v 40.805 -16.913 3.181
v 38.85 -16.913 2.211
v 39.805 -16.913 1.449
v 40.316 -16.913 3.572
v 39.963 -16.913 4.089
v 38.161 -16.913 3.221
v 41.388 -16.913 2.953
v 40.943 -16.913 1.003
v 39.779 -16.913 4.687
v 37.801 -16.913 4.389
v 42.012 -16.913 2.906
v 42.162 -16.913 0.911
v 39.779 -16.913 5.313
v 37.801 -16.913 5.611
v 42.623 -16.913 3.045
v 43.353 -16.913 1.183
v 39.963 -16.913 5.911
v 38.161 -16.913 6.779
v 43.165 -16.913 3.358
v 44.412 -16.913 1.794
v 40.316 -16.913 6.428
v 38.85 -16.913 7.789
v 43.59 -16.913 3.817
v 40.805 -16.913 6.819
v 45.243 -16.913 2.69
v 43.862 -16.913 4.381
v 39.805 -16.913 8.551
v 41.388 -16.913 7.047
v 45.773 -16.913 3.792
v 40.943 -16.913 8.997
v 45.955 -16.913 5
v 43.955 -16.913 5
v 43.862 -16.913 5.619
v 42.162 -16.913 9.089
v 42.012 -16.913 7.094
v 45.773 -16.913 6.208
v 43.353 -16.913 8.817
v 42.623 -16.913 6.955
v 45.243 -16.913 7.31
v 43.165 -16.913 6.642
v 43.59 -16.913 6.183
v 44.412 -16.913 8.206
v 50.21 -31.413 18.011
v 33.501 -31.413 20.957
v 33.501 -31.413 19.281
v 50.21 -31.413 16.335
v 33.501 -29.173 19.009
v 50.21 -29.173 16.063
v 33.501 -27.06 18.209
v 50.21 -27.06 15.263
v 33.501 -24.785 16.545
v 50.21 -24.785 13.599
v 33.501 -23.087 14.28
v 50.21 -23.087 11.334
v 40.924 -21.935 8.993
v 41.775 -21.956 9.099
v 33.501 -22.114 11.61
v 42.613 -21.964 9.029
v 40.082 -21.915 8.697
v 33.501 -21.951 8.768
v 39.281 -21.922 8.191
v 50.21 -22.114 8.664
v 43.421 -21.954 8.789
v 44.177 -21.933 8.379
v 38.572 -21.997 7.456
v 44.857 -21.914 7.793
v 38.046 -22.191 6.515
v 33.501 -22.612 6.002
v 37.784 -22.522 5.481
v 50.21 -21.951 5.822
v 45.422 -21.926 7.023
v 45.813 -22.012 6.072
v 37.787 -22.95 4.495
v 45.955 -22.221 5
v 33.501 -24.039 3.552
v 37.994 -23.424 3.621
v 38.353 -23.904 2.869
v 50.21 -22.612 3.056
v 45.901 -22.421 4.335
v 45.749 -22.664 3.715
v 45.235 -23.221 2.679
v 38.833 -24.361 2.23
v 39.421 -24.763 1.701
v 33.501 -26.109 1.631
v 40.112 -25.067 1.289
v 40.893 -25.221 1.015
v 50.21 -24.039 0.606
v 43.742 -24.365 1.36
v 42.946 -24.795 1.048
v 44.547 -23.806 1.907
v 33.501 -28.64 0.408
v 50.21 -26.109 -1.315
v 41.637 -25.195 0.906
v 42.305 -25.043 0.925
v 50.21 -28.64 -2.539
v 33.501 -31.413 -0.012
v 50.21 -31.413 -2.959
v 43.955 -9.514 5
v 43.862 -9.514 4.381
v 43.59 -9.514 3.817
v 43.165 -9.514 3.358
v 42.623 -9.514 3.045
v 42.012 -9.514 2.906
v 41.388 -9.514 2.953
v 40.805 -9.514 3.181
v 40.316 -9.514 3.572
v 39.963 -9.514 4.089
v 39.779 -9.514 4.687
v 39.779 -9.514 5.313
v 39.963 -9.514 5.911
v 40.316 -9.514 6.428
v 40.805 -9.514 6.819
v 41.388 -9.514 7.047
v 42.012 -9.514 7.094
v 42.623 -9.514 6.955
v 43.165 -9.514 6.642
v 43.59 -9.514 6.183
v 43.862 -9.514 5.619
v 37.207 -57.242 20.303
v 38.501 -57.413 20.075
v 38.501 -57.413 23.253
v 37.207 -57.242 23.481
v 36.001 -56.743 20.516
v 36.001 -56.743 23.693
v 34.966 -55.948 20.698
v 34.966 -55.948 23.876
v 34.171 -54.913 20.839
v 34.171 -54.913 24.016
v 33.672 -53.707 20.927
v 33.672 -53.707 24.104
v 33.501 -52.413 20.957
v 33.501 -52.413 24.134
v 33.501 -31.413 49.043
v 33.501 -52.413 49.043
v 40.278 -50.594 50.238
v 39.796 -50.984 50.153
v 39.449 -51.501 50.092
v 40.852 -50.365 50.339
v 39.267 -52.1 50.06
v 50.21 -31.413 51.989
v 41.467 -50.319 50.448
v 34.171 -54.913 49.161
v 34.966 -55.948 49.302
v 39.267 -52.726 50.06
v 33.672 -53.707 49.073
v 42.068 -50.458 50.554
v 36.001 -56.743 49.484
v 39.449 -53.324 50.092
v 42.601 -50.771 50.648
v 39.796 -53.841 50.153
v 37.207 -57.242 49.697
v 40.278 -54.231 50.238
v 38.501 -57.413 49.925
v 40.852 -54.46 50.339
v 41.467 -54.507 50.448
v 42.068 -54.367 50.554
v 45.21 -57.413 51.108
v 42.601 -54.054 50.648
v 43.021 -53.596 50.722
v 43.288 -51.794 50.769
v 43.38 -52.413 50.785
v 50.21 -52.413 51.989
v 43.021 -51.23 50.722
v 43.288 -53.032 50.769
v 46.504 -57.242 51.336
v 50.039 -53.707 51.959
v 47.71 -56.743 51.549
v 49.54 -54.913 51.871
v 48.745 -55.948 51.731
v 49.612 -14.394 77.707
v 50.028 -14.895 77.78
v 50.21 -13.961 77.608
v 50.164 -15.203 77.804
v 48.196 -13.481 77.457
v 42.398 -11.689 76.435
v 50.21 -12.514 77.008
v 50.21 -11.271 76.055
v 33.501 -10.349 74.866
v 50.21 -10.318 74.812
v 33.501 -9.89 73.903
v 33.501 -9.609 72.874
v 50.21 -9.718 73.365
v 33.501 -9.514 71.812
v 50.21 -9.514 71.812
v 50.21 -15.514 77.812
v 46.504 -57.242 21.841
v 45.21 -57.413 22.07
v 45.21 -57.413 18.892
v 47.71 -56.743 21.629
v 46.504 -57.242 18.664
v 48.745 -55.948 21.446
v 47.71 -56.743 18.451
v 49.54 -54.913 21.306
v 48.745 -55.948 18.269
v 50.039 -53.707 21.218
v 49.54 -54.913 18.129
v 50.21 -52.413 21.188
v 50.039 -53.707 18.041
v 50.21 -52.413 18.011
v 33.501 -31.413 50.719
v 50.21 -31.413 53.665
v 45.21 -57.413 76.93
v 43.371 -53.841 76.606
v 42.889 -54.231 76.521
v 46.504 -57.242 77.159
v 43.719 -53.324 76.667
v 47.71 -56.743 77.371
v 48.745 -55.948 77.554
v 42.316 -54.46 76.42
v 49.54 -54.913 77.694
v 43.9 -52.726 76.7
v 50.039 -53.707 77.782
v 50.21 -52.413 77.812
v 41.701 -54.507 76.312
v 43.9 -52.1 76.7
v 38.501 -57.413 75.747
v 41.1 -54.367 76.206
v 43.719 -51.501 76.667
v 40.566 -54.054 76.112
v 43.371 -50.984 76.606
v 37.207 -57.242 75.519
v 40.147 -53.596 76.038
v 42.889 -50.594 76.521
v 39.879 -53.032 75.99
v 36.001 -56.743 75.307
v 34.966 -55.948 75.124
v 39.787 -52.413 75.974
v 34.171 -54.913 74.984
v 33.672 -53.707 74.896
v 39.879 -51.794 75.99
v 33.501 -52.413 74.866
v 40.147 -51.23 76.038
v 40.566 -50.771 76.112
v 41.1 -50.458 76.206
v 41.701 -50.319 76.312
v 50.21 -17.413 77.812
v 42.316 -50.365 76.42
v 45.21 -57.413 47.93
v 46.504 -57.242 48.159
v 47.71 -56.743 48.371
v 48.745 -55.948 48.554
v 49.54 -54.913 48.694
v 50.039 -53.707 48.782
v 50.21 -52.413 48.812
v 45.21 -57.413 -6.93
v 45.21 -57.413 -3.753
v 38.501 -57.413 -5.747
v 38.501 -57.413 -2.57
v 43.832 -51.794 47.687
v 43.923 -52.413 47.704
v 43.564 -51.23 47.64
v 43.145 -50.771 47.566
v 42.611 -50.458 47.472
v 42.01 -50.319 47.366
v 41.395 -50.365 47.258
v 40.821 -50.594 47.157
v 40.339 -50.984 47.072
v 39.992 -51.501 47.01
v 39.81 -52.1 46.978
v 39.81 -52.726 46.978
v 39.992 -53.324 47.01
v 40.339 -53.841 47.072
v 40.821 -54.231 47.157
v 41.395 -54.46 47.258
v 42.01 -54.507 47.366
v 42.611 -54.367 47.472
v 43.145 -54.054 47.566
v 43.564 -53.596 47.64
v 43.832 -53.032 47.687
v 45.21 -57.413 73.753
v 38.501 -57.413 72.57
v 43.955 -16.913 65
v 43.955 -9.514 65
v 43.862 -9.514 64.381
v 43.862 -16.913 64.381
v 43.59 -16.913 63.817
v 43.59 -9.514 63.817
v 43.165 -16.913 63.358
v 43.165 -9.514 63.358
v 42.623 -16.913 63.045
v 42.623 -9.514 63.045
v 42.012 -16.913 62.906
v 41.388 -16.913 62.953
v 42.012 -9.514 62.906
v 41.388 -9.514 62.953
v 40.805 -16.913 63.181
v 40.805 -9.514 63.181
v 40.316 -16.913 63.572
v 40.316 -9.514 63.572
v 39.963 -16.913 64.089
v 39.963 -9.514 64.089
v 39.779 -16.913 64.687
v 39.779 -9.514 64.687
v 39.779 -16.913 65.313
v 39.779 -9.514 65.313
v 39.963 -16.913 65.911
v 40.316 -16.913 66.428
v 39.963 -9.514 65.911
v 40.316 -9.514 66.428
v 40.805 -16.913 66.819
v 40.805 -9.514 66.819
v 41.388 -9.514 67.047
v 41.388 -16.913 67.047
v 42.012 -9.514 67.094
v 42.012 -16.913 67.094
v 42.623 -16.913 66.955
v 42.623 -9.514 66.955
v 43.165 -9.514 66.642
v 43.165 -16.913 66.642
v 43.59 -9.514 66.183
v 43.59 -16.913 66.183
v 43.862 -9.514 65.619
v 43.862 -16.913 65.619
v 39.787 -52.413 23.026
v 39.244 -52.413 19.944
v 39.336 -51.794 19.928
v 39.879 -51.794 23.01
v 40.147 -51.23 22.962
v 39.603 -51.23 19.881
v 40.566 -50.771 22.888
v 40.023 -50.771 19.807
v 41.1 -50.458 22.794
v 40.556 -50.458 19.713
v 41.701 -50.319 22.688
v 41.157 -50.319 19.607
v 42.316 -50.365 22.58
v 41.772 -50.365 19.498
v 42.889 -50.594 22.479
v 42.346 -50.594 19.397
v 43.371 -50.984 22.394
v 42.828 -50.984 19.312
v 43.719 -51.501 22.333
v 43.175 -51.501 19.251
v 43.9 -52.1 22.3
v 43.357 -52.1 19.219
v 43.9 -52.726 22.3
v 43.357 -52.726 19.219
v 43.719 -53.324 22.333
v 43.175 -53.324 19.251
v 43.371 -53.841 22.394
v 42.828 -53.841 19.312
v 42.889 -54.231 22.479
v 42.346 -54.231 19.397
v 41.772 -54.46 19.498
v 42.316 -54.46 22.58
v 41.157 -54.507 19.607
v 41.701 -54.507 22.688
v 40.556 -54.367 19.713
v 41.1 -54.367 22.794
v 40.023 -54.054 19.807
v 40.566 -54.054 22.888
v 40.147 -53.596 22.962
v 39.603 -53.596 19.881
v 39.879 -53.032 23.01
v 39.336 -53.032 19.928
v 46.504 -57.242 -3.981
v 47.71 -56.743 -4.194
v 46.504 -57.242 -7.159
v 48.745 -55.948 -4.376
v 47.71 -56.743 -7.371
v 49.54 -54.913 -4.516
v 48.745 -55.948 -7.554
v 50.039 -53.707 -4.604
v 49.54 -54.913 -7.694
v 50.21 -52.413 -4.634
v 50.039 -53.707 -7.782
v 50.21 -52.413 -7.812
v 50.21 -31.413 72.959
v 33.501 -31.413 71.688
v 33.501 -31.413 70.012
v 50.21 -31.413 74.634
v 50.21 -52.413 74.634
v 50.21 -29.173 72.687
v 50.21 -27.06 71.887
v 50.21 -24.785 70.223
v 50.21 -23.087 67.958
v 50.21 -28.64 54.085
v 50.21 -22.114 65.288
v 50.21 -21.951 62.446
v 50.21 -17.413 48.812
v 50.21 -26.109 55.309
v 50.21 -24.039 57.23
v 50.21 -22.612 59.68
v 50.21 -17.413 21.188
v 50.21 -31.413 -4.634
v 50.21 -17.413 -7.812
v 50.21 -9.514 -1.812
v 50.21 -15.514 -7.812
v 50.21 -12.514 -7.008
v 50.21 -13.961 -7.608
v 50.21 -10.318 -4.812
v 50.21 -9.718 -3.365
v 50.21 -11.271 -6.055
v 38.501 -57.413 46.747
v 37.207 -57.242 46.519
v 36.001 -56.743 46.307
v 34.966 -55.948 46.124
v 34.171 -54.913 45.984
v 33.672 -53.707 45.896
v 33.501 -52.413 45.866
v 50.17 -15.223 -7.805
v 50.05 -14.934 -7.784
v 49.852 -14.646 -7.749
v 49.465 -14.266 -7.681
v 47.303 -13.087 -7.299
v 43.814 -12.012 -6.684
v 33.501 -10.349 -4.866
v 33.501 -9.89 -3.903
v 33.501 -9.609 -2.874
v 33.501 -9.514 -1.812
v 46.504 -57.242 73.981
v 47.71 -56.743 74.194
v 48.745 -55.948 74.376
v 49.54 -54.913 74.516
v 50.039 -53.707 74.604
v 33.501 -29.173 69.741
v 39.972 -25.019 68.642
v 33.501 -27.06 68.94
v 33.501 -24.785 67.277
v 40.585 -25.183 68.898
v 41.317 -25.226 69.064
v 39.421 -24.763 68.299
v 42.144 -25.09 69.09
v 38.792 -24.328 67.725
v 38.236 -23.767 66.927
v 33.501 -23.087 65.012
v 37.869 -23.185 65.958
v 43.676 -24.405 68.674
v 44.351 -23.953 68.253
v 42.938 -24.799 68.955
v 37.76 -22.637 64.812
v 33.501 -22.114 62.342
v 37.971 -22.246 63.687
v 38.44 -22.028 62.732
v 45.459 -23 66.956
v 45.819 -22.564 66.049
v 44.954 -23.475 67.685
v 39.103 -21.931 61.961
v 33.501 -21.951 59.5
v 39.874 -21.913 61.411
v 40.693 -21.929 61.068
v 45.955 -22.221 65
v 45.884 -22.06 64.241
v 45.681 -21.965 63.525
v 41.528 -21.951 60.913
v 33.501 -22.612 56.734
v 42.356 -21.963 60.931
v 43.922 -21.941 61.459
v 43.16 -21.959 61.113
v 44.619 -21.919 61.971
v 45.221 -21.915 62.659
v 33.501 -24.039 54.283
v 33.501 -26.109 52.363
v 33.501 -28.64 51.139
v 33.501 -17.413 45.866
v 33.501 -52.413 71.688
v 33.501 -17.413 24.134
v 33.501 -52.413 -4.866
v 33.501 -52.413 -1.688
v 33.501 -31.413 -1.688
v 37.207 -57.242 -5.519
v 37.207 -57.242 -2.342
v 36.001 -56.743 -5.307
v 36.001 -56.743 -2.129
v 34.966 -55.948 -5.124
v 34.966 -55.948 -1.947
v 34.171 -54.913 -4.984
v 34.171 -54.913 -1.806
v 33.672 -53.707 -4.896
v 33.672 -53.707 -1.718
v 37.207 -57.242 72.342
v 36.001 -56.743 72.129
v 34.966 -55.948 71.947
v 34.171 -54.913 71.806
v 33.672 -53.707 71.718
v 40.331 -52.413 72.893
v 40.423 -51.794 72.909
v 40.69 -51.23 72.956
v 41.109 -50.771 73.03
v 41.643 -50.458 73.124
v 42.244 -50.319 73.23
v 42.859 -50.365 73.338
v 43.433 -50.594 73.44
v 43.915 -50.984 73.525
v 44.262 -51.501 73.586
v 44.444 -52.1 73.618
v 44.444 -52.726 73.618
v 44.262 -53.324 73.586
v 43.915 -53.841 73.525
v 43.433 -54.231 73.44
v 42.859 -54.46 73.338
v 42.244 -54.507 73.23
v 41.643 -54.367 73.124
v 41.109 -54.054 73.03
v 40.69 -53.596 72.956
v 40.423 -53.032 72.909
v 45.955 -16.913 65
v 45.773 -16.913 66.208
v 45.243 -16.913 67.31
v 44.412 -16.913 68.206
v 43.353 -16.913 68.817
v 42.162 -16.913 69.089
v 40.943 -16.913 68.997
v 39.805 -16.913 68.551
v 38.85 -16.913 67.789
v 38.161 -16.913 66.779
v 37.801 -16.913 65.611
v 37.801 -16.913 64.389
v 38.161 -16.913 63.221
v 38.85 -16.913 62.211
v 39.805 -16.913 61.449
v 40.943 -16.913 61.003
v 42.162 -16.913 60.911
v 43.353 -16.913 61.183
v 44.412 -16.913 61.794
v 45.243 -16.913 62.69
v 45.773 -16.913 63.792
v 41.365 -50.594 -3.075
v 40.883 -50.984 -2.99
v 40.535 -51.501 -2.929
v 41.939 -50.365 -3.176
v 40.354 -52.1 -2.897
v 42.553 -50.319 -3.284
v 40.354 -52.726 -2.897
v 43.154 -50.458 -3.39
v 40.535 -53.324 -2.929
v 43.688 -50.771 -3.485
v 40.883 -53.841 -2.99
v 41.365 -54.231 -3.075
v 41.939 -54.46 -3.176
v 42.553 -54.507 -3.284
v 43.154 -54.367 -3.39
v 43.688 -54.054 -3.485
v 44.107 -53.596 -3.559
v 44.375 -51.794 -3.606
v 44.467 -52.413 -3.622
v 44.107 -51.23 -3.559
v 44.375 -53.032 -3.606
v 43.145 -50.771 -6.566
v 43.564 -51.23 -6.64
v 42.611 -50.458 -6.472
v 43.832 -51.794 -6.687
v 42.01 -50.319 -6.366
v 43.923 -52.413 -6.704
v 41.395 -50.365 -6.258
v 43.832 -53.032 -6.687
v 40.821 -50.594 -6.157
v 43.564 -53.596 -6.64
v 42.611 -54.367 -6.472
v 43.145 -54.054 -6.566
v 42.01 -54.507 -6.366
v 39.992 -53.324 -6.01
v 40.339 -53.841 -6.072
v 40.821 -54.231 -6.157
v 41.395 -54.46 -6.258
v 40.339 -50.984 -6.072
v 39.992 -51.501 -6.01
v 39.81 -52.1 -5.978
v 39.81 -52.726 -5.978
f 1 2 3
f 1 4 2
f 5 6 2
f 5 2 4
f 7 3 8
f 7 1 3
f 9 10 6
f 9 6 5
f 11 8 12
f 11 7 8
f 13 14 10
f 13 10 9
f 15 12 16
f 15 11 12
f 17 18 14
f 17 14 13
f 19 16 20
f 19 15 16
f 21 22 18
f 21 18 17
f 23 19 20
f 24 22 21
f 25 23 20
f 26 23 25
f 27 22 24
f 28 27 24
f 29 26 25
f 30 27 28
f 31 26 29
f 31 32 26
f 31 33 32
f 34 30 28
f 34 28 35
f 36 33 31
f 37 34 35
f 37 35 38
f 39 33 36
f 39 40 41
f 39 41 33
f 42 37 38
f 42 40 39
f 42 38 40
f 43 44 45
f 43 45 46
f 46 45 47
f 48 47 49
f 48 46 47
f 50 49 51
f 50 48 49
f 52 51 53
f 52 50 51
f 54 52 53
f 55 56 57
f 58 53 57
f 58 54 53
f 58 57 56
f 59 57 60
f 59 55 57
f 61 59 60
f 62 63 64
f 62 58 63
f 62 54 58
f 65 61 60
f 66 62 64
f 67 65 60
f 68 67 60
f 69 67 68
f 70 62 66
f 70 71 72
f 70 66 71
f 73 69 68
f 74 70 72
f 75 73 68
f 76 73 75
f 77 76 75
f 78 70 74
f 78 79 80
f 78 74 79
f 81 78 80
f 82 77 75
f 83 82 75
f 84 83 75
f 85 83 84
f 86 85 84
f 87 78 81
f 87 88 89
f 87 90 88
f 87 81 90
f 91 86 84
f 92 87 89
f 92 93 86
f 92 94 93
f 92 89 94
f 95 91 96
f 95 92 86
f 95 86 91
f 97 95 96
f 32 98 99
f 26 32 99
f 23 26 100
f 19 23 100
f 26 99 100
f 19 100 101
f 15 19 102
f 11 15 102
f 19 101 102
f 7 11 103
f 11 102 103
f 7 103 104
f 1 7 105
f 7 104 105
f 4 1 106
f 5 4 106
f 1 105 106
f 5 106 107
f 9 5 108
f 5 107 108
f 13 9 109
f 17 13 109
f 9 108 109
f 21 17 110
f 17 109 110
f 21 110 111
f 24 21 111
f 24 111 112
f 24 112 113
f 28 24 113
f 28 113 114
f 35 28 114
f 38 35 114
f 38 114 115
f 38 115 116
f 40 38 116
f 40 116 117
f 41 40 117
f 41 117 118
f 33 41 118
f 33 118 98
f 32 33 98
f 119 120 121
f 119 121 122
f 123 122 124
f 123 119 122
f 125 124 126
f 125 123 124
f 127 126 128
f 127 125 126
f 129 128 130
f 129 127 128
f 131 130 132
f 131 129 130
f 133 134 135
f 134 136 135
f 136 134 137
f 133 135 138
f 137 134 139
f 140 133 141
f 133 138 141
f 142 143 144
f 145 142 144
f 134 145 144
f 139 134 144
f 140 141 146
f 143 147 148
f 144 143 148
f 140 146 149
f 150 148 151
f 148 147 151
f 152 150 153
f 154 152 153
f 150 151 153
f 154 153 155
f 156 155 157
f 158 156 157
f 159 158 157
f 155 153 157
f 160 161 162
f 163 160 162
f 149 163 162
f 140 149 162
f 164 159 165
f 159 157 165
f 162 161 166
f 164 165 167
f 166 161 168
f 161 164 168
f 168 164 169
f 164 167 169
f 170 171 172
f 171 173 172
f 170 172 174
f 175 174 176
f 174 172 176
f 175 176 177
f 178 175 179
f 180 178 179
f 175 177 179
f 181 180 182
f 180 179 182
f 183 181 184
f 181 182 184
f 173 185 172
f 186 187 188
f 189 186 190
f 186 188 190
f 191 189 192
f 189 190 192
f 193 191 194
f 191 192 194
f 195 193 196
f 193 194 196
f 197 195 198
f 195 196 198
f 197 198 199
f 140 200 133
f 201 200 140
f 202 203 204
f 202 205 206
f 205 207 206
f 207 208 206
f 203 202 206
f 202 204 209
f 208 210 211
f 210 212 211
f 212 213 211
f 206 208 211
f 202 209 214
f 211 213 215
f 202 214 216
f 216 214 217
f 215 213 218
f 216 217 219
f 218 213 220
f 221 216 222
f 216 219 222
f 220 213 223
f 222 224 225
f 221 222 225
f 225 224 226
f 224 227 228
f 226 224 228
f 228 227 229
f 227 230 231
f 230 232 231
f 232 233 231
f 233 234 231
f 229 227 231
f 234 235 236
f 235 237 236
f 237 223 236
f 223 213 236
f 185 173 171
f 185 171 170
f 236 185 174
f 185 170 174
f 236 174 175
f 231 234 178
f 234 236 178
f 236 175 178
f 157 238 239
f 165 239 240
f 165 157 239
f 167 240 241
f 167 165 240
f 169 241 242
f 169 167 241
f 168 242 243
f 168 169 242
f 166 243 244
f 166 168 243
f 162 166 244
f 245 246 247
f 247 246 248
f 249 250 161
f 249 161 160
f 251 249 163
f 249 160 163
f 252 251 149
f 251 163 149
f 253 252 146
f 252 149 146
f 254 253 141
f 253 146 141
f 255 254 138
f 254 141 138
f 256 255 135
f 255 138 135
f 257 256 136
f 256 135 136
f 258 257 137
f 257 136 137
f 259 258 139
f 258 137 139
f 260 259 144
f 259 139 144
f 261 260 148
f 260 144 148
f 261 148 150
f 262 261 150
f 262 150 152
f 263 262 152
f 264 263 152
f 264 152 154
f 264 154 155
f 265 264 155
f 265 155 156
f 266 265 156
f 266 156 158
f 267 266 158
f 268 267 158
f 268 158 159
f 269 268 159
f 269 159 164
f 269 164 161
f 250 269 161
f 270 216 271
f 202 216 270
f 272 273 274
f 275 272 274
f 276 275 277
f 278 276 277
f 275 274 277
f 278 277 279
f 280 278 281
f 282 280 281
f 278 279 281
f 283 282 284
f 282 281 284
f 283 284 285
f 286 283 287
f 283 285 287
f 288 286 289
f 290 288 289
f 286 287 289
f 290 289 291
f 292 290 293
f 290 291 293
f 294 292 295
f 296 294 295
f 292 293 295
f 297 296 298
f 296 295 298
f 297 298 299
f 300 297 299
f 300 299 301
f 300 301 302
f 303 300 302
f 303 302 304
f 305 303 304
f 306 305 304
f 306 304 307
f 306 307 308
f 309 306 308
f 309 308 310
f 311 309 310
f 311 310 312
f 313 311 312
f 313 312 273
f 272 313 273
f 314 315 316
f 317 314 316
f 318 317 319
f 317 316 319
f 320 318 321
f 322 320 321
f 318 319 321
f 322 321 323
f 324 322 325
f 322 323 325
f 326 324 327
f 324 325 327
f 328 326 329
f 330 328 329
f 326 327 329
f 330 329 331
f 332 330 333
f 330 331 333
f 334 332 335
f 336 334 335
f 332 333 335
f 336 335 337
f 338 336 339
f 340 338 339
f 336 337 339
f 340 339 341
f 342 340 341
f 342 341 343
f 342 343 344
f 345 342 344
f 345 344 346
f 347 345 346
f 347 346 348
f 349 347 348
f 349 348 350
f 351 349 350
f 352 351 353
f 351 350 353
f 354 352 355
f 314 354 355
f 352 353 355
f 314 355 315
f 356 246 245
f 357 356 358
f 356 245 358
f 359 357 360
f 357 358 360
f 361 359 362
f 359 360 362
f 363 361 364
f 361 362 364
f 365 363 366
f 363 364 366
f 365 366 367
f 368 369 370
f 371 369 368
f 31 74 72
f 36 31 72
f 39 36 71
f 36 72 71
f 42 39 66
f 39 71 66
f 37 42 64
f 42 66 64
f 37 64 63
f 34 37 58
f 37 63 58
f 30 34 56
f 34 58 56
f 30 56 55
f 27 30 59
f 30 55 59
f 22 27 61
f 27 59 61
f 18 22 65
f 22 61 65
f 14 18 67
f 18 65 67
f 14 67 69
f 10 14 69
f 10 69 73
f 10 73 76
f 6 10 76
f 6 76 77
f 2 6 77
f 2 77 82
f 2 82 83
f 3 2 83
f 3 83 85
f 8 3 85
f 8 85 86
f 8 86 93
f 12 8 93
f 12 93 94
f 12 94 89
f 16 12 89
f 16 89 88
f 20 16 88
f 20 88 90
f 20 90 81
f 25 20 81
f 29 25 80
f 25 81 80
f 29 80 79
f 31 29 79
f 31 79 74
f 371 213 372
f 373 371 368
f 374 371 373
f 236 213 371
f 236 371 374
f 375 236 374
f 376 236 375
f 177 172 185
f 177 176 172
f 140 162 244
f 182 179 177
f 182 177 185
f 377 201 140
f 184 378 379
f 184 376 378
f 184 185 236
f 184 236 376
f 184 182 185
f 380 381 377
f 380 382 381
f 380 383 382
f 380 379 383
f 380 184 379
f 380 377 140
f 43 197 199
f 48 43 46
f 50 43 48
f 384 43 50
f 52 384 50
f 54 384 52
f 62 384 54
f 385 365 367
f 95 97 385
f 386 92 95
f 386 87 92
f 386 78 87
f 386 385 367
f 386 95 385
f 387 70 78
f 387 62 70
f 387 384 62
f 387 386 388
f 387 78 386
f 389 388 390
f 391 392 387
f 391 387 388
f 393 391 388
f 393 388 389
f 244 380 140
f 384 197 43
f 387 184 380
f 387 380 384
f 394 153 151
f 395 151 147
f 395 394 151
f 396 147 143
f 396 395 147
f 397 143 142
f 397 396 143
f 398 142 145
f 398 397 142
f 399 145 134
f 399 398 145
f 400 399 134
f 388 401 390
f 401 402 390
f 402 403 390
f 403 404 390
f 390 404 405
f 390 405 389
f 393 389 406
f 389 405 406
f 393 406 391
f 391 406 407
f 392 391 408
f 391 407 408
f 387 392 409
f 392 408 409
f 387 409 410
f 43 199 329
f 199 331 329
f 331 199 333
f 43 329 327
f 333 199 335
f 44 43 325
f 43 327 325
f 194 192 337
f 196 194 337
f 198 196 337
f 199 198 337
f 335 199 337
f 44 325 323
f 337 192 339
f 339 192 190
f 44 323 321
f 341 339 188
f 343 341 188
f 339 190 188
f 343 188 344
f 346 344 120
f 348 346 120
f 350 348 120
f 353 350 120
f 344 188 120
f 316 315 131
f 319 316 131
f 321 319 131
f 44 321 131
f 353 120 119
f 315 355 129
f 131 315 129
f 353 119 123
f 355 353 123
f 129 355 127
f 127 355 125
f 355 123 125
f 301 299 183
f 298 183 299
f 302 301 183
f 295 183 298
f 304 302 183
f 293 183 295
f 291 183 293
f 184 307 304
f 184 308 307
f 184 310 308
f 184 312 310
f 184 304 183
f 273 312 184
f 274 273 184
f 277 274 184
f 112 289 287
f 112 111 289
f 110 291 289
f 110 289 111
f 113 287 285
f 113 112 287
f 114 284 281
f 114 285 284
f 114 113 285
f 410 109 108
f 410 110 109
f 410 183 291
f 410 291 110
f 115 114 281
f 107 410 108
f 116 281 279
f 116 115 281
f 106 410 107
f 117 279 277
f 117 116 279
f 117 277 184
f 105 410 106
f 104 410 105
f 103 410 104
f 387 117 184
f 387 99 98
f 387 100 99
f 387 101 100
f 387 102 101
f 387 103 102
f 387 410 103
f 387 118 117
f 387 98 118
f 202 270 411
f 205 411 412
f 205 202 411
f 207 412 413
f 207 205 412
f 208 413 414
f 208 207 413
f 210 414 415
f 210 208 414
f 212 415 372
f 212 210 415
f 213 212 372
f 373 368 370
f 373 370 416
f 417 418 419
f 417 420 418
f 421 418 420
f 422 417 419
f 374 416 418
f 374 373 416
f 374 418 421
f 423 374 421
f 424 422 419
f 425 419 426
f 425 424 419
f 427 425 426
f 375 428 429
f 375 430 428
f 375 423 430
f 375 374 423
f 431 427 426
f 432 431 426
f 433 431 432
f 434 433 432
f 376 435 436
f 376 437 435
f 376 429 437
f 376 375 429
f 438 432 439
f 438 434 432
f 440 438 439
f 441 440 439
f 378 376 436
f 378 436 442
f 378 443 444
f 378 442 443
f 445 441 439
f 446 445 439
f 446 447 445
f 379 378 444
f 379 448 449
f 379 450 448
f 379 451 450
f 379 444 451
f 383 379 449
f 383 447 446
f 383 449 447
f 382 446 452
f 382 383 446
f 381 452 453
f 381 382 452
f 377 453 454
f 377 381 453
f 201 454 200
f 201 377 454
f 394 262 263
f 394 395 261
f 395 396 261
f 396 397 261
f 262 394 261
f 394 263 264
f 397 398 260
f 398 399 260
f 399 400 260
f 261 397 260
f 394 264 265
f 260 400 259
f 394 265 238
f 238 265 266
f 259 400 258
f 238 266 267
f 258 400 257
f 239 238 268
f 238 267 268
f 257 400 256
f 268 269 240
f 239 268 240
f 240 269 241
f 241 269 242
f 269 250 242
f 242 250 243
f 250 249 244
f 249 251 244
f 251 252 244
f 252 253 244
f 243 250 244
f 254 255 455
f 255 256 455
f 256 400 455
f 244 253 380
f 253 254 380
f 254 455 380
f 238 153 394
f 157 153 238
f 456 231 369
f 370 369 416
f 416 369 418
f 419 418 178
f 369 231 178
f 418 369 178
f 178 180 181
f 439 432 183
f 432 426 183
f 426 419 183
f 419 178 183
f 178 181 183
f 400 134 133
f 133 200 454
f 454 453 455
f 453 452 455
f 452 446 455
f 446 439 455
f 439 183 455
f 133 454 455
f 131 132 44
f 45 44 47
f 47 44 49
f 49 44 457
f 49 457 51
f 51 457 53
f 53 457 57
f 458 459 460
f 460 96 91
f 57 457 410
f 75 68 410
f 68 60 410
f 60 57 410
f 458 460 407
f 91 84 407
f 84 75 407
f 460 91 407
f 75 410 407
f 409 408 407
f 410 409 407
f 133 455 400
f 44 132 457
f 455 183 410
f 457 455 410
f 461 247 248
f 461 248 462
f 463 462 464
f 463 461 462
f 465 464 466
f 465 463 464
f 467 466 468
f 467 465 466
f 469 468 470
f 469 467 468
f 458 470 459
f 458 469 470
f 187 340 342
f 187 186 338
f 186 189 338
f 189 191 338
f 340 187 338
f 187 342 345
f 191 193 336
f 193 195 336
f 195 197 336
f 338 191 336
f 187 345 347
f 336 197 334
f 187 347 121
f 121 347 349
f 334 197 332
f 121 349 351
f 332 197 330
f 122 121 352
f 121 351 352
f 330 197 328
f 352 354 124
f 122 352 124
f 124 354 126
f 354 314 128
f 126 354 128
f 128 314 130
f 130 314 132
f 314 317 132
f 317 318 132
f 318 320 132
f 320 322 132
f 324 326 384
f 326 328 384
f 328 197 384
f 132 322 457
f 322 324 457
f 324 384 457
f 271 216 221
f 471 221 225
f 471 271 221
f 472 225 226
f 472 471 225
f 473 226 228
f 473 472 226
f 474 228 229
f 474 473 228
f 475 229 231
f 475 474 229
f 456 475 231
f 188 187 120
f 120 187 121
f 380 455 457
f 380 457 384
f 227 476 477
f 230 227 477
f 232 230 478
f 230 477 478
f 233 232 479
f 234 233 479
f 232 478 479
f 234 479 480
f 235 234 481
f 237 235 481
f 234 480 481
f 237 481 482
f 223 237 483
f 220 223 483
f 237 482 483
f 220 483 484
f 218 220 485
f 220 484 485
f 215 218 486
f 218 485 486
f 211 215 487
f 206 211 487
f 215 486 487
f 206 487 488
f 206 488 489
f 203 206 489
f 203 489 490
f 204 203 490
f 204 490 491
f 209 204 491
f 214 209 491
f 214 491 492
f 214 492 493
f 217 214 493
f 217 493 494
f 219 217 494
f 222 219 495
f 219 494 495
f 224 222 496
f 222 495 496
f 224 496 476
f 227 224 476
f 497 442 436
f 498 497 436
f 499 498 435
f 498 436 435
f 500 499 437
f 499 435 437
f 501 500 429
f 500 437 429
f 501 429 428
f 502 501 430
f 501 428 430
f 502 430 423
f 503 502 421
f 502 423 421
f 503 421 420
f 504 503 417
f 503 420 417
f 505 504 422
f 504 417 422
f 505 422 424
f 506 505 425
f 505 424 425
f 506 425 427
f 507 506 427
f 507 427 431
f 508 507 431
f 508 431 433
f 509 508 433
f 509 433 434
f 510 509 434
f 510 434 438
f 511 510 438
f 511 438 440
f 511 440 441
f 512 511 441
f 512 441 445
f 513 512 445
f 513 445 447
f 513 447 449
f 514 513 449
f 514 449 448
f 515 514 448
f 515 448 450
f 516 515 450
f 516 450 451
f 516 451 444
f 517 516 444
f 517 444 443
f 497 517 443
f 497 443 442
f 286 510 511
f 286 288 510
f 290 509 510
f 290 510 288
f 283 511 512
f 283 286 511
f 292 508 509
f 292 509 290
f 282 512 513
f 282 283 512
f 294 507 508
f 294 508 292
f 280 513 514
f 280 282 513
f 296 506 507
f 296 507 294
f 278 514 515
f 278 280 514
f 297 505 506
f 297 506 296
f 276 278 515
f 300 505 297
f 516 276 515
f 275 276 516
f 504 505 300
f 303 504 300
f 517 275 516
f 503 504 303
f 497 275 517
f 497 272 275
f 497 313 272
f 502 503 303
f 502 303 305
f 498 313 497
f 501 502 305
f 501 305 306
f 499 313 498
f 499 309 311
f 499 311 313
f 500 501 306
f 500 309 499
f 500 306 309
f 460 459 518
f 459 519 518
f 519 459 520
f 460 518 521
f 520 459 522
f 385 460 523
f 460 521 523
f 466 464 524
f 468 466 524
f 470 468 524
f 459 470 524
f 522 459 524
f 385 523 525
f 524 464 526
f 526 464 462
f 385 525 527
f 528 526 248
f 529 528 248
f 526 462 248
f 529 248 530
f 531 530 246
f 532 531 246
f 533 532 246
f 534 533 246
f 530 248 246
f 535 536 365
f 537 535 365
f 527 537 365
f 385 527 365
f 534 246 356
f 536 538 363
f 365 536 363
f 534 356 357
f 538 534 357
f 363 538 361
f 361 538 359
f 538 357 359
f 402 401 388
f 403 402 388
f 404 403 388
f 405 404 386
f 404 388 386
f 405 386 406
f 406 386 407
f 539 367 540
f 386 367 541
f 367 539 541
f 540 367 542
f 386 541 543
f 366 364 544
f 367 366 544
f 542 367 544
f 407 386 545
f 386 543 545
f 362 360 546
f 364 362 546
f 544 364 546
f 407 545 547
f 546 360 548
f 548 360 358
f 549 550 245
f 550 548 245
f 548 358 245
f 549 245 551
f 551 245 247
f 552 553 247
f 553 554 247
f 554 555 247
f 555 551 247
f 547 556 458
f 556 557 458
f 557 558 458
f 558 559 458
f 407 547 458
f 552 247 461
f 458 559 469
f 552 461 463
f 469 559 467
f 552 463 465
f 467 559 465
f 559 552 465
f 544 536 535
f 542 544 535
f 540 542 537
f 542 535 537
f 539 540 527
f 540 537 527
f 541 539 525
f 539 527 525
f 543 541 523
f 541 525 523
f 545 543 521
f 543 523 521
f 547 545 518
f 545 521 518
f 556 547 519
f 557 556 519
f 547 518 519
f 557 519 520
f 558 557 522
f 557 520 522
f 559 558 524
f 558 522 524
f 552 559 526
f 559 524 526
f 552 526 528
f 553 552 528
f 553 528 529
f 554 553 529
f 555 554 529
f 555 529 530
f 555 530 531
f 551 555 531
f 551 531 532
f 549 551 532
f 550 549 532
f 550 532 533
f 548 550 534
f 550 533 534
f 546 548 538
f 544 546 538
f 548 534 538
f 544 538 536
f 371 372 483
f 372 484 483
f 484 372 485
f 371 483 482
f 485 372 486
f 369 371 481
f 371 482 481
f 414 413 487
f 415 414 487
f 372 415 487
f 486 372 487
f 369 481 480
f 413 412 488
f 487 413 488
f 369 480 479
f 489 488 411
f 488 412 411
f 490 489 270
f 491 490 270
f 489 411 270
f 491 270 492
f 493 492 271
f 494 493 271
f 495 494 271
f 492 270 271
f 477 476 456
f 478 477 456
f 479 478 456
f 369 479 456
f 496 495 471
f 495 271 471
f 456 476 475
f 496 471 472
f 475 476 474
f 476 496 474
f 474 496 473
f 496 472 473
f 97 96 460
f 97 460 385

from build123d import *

# Parameters (mm, degrees)
SKETCH1_R             = 21
BOSS_EXTRUDE1_DEPTH   = 70
SKETCH2_W             = 46.708404894
SKETCH2_H             = 50
SKETCH2_W_2           = 13.291595106
CUT_EXTRUDE6_DEPTH    = 1000
CUT_EXTRUDE7_DEPTH    = 500
CUT_EXTRUDE9_DEPTH    = 10
CUT_EXTRUDE10_DEPTH   = 30
FILLET1_R             = 10
BOSS_EXTRUDE4_DEPTH   = 25
FILLET3_R             = 10
SKETCH14_R            = 4
CUT_EXTRUDE11_DEPTH   = 127.980923087
CUT_EXTRUDE12_START   = -2
CUT_EXTRUDE12_DEPTH   = 2
CUT_EXTRUDE13_DEPTH   = 2
BOSS_EXTRUDE5_REACH   = 117.988
SKETCH20_W            = 16.708404894
SKETCH20_H            = 7.898698888
SKETCH26_W            = 16.708404894
SKETCH26_H            = 7.898698888
BOSS_EXTRUDE12_DEPTH  = 7.811994
SKETCH27_W            = 16.708404894
SKETCH27_H            = 7.898698888
BOSS_EXTRUDE13_DEPTH  = 7.811994
FILLET4_R             = 6
FILLET5_R             = 6
BOSS_EXTRUDE14_DEPTH  = 40
BOSS_EXTRUDE15_DEPTH  = 40
CUT_EXTRUDE14_DEPTH   = 156.020628616
BOSS_EXTRUDE16_DEPTH  = 40
CUT_EXTRUDE16_DEPTH   = 154.401382374
CUT_EXTRUDE17_DEPTH   = 20
CUT_EXTRUDE18_DEPTH   = 20
CUT_EXTRUDE19_DEPTH   = 138.956751978
SKETCH40_W            = 185.24105406
SKETCH40_H            = 117.002542876
CUT_EXTRUDE21_DEPTH   = 127.12652477
SKETCH41_W            = 67.695511819
SKETCH41_H            = 32.478739283
CUT_EXTRUDE22_DEPTH   = 109.958332386
FILLET6_R             = 5
SKETCH78_R            = 4.1
CUT_EXTRUDE23_DEPTH   = 40.5
M5_TAPPED_HOLE2_D     = 4.2
M5_TAPPED_HOLE3_D     = 4.2
M5_TAPPED_HOLE3_DEPTH = 3.9381927
M5_TAPPED_HOLE3_TIP   = 1.2618073
M5_TAPPED_HOLE4_D     = 4.2
M5_TAPPED_HOLE4_DEPTH = 3.9381927
M5_TAPPED_HOLE4_TIP   = 1.2618073
M5_TAPPED_HOLE5_D     = 4.2
M5_TAPPED_HOLE5_DEPTH = 3.9381927
M5_TAPPED_HOLE5_TIP   = 1.2618073
M5_TAPPED_HOLE6_D     = 4.2
M5_TAPPED_HOLE6_DEPTH = 11.1381927
M5_TAPPED_HOLE6_TIP   = 1.2618073
CUT_EXTRUDE24_DEPTH   = 26
CUT_EXTRUDE25_DEPTH   = 26


with BuildPart() as part:
    # Sketch1 → Boss-Extrude1 (new body)
    with BuildSketch(Plane.XY):
        with BuildLine():
            Line((-49.790434142, -17.412639916), (50.209565858, -17.412639916))
            Line((50.209565858, -17.412639916), (50.209565858, -9.513941028))
            ThreePointArc((50.209565858, -9.513941028), (38.690061243, 42.665747249), (-10.864044799, 22.670512076))
            add(Edge.make_bspline(
                [(-49.790434142, -1.270303125), (-17.557932869, 2.386486473), (-10.864044799, 22.670512076)],
                knots=[0, 0, 0, 1, 1, 1], degree=2))
            Line((-49.790434142, -1.270303125), (-49.790434142, -17.412639916))
        make_face()
        with Locations((22.372880083, 11.702065313)):
            Circle(SKETCH1_R, mode=Mode.SUBTRACT)
    extrude(amount=BOSS_EXTRUDE1_DEPTH)

    # Sketch2 → Cut-Extrude6 (cut)
    with BuildSketch(Plane.XZ.offset(17.412639916)):
        with Locations((26.855363411, 35)):
            Rectangle(SKETCH2_W, SKETCH2_H)
        with Locations((56.855363411, 35)):
            Rectangle(SKETCH2_W_2, SKETCH2_H)
    extrude(amount=-CUT_EXTRUDE6_DEPTH, mode=Mode.SUBTRACT)

    # Sketch4 → Cut-Extrude7 (cut, symmetric)
    with BuildSketch(Plane(origin=(0, 0, 60), x_dir=(-1, 0, 0), z_dir=(0, 0, -1))):
        Polygon((-3.501160964, -17.412639916), (-33.501160964, -17.412639916), (-33.501160964, -6.106959496), (-3.501160964, 2.490213302), align=None)
    extrude(amount=CUT_EXTRUDE7_DEPTH, both=True, mode=Mode.SUBTRACT)

    # Sketch6 → Cut-Extrude9 (cut)
    with BuildSketch(Plane.XZ.offset(17.412639916)):
        with BuildLine():
            Line((-24.792277304, 11.964880704), (3.501160964, 10))
            Line((3.501160964, 10), (3.501160964, 60))
            Line((3.501160964, 60), (-24.792277304, 58.035119296))
            ThreePointArc((-24.792277304, 58.035119296), (-36.706675963, 52.357484539), (-41.545243514, 40.078368289))
            Line((-41.545243514, 40.078368289), (-41.545243514, 29.921631711))
            ThreePointArc((-41.545243514, 29.921631711), (-36.706675963, 17.642515461), (-24.792277304, 11.964880704))
        make_face()
    extrude(amount=-CUT_EXTRUDE9_DEPTH, mode=Mode.SUBTRACT)

    # Sketch7 → Cut-Extrude10 (cut)
    with BuildSketch(Plane.XZ.offset(17.412639916)):
        with BuildLine():
            Line((-49.790434142, 0), (-26.790434142, 0))
            ThreePointArc((-26.790434142, 0), (-40.575408311, 4.143958018), (-49.790434142, 15.202041029))
            Line((-49.790434142, 15.202041029), (-49.790434142, 0))
        make_face()
        with BuildLine():
            Line((-51.790434142, 0), (-49.790434142, 0))
            Line((-49.790434142, 0), (-49.790434142, 15.202041029))
            ThreePointArc((-49.790434142, 15.202041029), (-51.285331569, 20), (-51.790434142, 25))
            Line((-51.790434142, 25), (-51.790434142, 0))
        make_face()
        with BuildLine():
            ThreePointArc((-51.790434142, 45), (-51.285331569, 50), (-49.790434142, 54.797958971))
            Line((-49.790434142, 54.797958971), (-49.790434142, 70))
            Line((-49.790434142, 70), (-51.790434142, 70))
            Line((-51.790434142, 70), (-51.790434142, 45))
        make_face()
        with BuildLine():
            Line((-49.790434142, 70), (-49.790434142, 54.797958971))
            ThreePointArc((-49.790434142, 54.797958971), (-40.575408311, 65.856041982), (-26.790434142, 70))
            Line((-26.790434142, 70), (-49.790434142, 70))
        make_face()
        with BuildLine():
            ThreePointArc((-51.790434142, 25), (-51.285331569, 20), (-49.790434142, 15.202041029))
            Line((-49.790434142, 15.202041029), (-49.790434142, 54.797958971))
            ThreePointArc((-49.790434142, 54.797958971), (-51.285331569, 50), (-51.790434142, 45))
            Line((-51.790434142, 45), (-51.790434142, 25))
        make_face()
    extrude(amount=-CUT_EXTRUDE10_DEPTH, mode=Mode.SUBTRACT)

    # Fillet1
    fillet1_edges = [part.edges().sort_by_distance(p)[0] for p in [
        (-49.790434142, -1.270303125, 35),
    ]]
    fillet(fillet1_edges, radius=FILLET1_R)

    # Sketch13 → Boss-Extrude4 (add, symmetric)
    with BuildSketch(Plane(origin=(0, 0, 35), x_dir=(-1, 0, 0), z_dir=(0, 0, -1))):
        with BuildLine():
            Line((-3.501160964, 41.17846634), (-24.884209642, 72.591285845))
            Line((-24.884209642, 72.591285845), (-12.526412407, 81.003373139))
            Line((-12.526412407, 81.003373139), (8.038253711, 50.792800518))
            ThreePointArc((8.038253711, 50.792800518), (9.622093989, 48.312116906), (11.057231329, 45.742540671))
            Line((11.057231329, 45.742540671), (33.791827707, 2.064737728))
            add(Edge.make_bspline(
                [(10.864044799, 22.670512076), (15.694334208, 8.033620479), (33.791827707, 2.064737728)],
                knots=[0, 0, 0, 1, 1, 1], degree=2))
            ThreePointArc((10.864044799, 22.670512076), (5.276058191, 33.162172776), (-3.501160964, 41.17846634))
        make_face()
    extrude(amount=BOSS_EXTRUDE4_DEPTH, both=True)

    # Fillet3
    fillet3_edges = [part.edges().sort_by_distance(p)[0] for p in [
        (18.705311024, 76.797329492, 60),
        (18.705311024, 76.797329492, 10),
    ]]
    fillet(fillet3_edges, radius=FILLET3_R)

    # Sketch14 → Cut-Extrude11 (cut, through all)
    with BuildSketch(Plane(origin=(-29.120143538, 19.822399154, 0), x_dir=(0, 0, 1), z_dir=(-0.8266531448642671, 0.5627118073099384, 0))):
        with Locations(Location((35, 55.764287513, 0), (0, 0, 270))):
            Circle(SKETCH14_R)
    extrude(amount=-CUT_EXTRUDE11_DEPTH, mode=Mode.SUBTRACT)

    # Sketch16 → Cut-Extrude12 (cut)
    with BuildSketch(Plane.XY.offset(70).offset(CUT_EXTRUDE12_START)):
        with BuildLine():
            ThreePointArc((33.501160964, -7.853275764), (27.695040964, 33.563552078), (3.501160964, -0.549800564))
            Line((3.501160964, -0.549800564), (3.501160964, 2.490213302))
            ThreePointArc((3.501160964, 2.490213302), (28.158038159, 31.889485803), (33.501160964, -6.106959496))
            Line((33.501160964, -6.106959496), (33.501160964, -7.853275764))
        make_face()
    extrude(amount=CUT_EXTRUDE12_DEPTH, mode=Mode.SUBTRACT)

    # Sketch17 → Cut-Extrude13 (cut)
    with BuildSketch(Plane(origin=(0, 0, 0), x_dir=(-1, 0, 0), z_dir=(0, 0, -1))):
        with BuildLine():
            ThreePointArc((-3.501160964, -0.549800564), (-27.695040964, 33.563552078), (-33.501160964, -7.853275764))
            Line((-33.501160964, -7.853275764), (-33.501160964, -6.106959496))
            ThreePointArc((-33.501160964, -6.106959496), (-28.158038159, 31.889485803), (-3.501160964, 2.490213302))
            Line((-3.501160964, 2.490213302), (-3.501160964, -0.549800564))
        make_face()
    extrude(amount=-CUT_EXTRUDE13_DEPTH, mode=Mode.SUBTRACT)

    # Sketch20 → Boss-Extrude5 (add, up to next)
    with BuildSketch(Plane.XY.offset(10), mode=Mode.PRIVATE) as boss_extrude5_sk1:
        with Locations((41.855363411, -13.463290472)):
            Rectangle(SKETCH20_W, SKETCH20_H)
    boss_extrude5_tool1 = extrude(boss_extrude5_sk1.sketch, amount=BOSS_EXTRUDE5_REACH, mode=Mode.PRIVATE) - part.part
    add(boss_extrude5_tool1.solids().sort_by_distance((41.855363, -13.46329, 10))[0])

    # Sketch26 → Boss-Extrude12 (add)
    with BuildSketch(Plane(origin=(0, 0, 0), x_dir=(-1, 0, 0), z_dir=(0, 0, -1))):
        with Locations((-41.855363411, -13.463290472)):
            Rectangle(SKETCH26_W, SKETCH26_H)
    extrude(amount=BOSS_EXTRUDE12_DEPTH)

    # Sketch27 → Boss-Extrude13 (add)
    with BuildSketch(Plane.XY.offset(70)):
        with Locations((41.855363411, -13.463290472)):
            Rectangle(SKETCH27_W, SKETCH27_H)
    extrude(amount=BOSS_EXTRUDE13_DEPTH)

    # Fillet4
    fillet4_edges = [part.edges().sort_by_distance(p)[0] for p in [
        (41.855363411, -9.513941028, -7.811994),
    ]]
    fillet(fillet4_edges, radius=FILLET4_R)

    # Fillet5
    fillet5_edges = [part.edges().sort_by_distance(p)[0] for p in [
        (41.855363411, -9.513941028, 77.811994),
    ]]
    fillet(fillet5_edges, radius=FILLET5_R)

    # Sketch22 → Boss-Extrude14 (add)
    with BuildSketch(Plane.XZ.offset(17.412639916)):
        Polygon((50.209565858, 48.811993748), (50.209565858, 77.811993748), (33.501160964, 74.865851161), (33.501160964, 45.865851161), align=None)
        Polygon((50.209565858, 21.188006252), (33.501160964, 24.134148839), (33.501160964, -4.865851161), (50.209565858, -7.811993748), align=None)
    extrude(amount=BOSS_EXTRUDE14_DEPTH)

    # Sketch31 → Boss-Extrude15 (add)
    with BuildSketch(Plane.XZ.offset(57.412639916)):
        Polygon((50.209565858, 21.188006252), (55.168857937, 20.313549253), (50.209565858, -7.811993748), align=None)
    extrude(amount=-BOSS_EXTRUDE15_DEPTH)

    # Sketch33 → Cut-Extrude14 (cut, through all)
    with BuildSketch(Plane(origin=(50.031491805, 0, -8.82190189), x_dir=(-0.17364817766693016, 0, -0.9848077530122082), z_dir=(0.9848077530122082, 0, -0.17364817766693016))):
        with BuildLine():
            Line((-5.805200022, -31.412639916), (-5.805200022, -57.412639916))
            Line((-5.805200022, -57.412639916), (-24.805200022, -57.412639916))
            Line((-24.805200022, -57.412639916), (-24.805200022, -31.412639916))
            ThreePointArc((-24.805200022, -31.412639916), (-15.305200022, -21.912639916), (-5.805200022, -31.412639916))
        make_face()
    extrude(amount=-CUT_EXTRUDE14_DEPTH, mode=Mode.SUBTRACT)

    # Sketch34 → Boss-Extrude16 (add)
    with BuildSketch(Plane.XZ.offset(57.412639916)):
        Polygon((50.209565858, 48.811993748), (55.168857937, 49.686450747), (50.209565858, 77.811993748), align=None)
    extrude(amount=-BOSS_EXTRUDE16_DEPTH)

    # Sketch36 → Cut-Extrude16 (cut, through all)
    with BuildSketch(Plane(origin=(62.002196821, 0, 10.932660163), x_dir=(0.1736481776669346, 0, -0.9848077530122074), z_dir=(0.9848077530122075, 0, 0.17364817766693463))):
        with BuildLine():
            Line((-44.131342689, -31.412639916), (-44.131342689, -57.412639916))
            Line((-44.131342689, -57.412639916), (-63.131342689, -57.412639916))
            Line((-63.131342689, -57.412639916), (-63.131342689, -31.412639916))
            ThreePointArc((-63.131342689, -31.412639916), (-53.631342689, -21.912639916), (-44.131342689, -31.412639916))
        make_face()
    extrude(amount=-CUT_EXTRUDE16_DEPTH, mode=Mode.SUBTRACT)

    # Sketch37 → Cut-Extrude17 (cut)
    with BuildSketch(Plane.XZ.offset(17.412639916)):
        Polygon((33.501160964, -4.865851161), (33.501160964, -7.811993748), (50.209565858, -7.811993748), align=None)
    extrude(amount=-CUT_EXTRUDE17_DEPTH, mode=Mode.SUBTRACT)

    # Sketch38 → Cut-Extrude18 (cut)
    with BuildSketch(Plane.XZ.offset(17.412639916)):
        Polygon((50.209565858, 77.811993748), (33.501160964, 77.811993748), (33.501160964, 74.865851161), align=None)
    extrude(amount=-CUT_EXTRUDE18_DEPTH, mode=Mode.SUBTRACT)

    # Sketch39 → Cut-Extrude19 (cut, through all)
    with BuildSketch(Plane(origin=(0, -17.412639916, 0), x_dir=(1, 0, 0), z_dir=(0, 1, 0))):
        Polygon((50.209565858, -48.811993748), (55.168857937, -49.686450747), (50.209565858, -77.811993748), align=None)
        Polygon((50.209565858, 7.811993748), (55.168857937, -20.313549253), (50.209565858, -21.188006252), align=None)
    extrude(amount=-CUT_EXTRUDE19_DEPTH, mode=Mode.SUBTRACT)

    # Sketch40 → Cut-Extrude21 (cut, through all)
    with BuildSketch(Plane.XY):
        with Locations((-9.514852979, 48.98733041)):
            Rectangle(SKETCH40_W, SKETCH40_H)
    extrude(amount=CUT_EXTRUDE21_DEPTH, mode=Mode.SUBTRACT)


with BuildPart() as cut_extrude21_piece_1:
    # of the separate pieces the step leaves, piece 1, a body of its own (cut_extrude21_pieces)
    add(part.part.solids().sort_by_distance((33.501160964, -57.412639916, 74.865851161))[0])

    # Fillet6
    fillet6_edges = [cut_extrude21_piece_1.edges().sort_by_distance(p)[0] for p in [
        (33.501160964, -57.412639916, 72.439127567),
        (33.501160964, -57.412639916, -2.439127567),
        (33.501160964, -57.412639916, 21.707425246),
        (33.501160964, -57.412639916, 48.292574754),
        (50.209565858, -57.412639916, 51.238717342),
        (50.209565858, -57.412639916, 75.385270155),
        (50.209565858, -57.412639916, -5.385270155),
        (50.209565858, -57.412639916, 18.761282658),
    ]]
    fillet(fillet6_edges, radius=FILLET6_R)

    # Sketch78 → Cut-Extrude23 (cut)
    with BuildSketch(Plane.XZ.offset(57.412639916)):
        with Locations((41.855363411, 5)):
            Circle(SKETCH78_R)
        with Locations((41.855363411, 65)):
            Circle(SKETCH78_R)
    extrude(amount=-CUT_EXTRUDE23_DEPTH, mode=Mode.SUBTRACT)

    # M5 Tapped Hole2 (through all)
    with Locations(Plane(origin=(41.855363411, -16.912639916, 65), x_dir=(-1, 0, 0), z_dir=(0, -1, 0))):
        with Locations((0, 0), (0, 60)):
            Hole(M5_TAPPED_HOLE2_D / 2)

    # M5 Tapped Hole3
    with Locations(Plane(origin=(41.855363411, -52.412639916, -6.338922455), x_dir=(-0.984807753012, 0, 0.173648177667), z_dir=(-0.173648177667, 0, -0.984807753012))):
        with Locations((0, 0)):
            Hole(M5_TAPPED_HOLE3_D / 2, depth=M5_TAPPED_HOLE3_DEPTH)
            with Locations((0, 0, -(M5_TAPPED_HOLE3_DEPTH + M5_TAPPED_HOLE3_TIP / 2))):  # 118° drill point
                Cone(0, M5_TAPPED_HOLE3_D / 2, M5_TAPPED_HOLE3_TIP, mode=Mode.SUBTRACT)

    # M5 Tapped Hole4
    with Locations(Plane(origin=(41.855363411, -52.412639916, 76.338922455), x_dir=(0.984807753012, 0, 0.173648177667), z_dir=(-0.173648177667, 0, 0.984807753012))):
        with Locations((0, 0)):
            Hole(M5_TAPPED_HOLE4_D / 2, depth=M5_TAPPED_HOLE4_DEPTH)
            with Locations((0, 0, -(M5_TAPPED_HOLE4_DEPTH + M5_TAPPED_HOLE4_TIP / 2))):  # 118° drill point
                Cone(0, M5_TAPPED_HOLE4_D / 2, M5_TAPPED_HOLE4_TIP, mode=Mode.SUBTRACT)

    # M5 Tapped Hole5
    with Locations(Plane(origin=(41.855363411, -52.412639916, 22.661077545), x_dir=(0.984807753012, 0, -0.173648177667), z_dir=(0.173648177667, 0, 0.984807753012))):
        with Locations((0, 0)):
            Hole(M5_TAPPED_HOLE5_D / 2, depth=M5_TAPPED_HOLE5_DEPTH)
            with Locations((0, 0, -(M5_TAPPED_HOLE5_DEPTH + M5_TAPPED_HOLE5_TIP / 2))):  # 118° drill point
                Cone(0, M5_TAPPED_HOLE5_D / 2, M5_TAPPED_HOLE5_TIP, mode=Mode.SUBTRACT)

    # M5 Tapped Hole6
    with Locations(Plane(origin=(41.855363411, -52.412639916, 47.338922455), x_dir=(-0.984807753012, 0, -0.173648177667), z_dir=(0.173648177667, 0, -0.984807753012))):
        with Locations((0, 0)):
            Hole(M5_TAPPED_HOLE6_D / 2, depth=M5_TAPPED_HOLE6_DEPTH)
            with Locations((0, 0, -(M5_TAPPED_HOLE6_DEPTH + M5_TAPPED_HOLE6_TIP / 2))):  # 118° drill point
                Cone(0, M5_TAPPED_HOLE6_D / 2, M5_TAPPED_HOLE6_TIP, mode=Mode.SUBTRACT)

    # Sketch88 → Cut-Extrude24 (cut)
    with BuildSketch(Plane.XZ.offset(57.412639916)):
        Polygon((33.501160964, -1.688351161), (50.209565858, -4.634493748), (50.209565858, 18.010506252), (33.501160964, 20.956648839), align=None)
    extrude(amount=-CUT_EXTRUDE24_DEPTH, mode=Mode.SUBTRACT)

    # Sketch93 → Cut-Extrude25 (cut)
    with BuildSketch(Plane.XZ.offset(57.412639916)):
        Polygon((33.501160964, 49.043351161), (50.209565858, 51.989493748), (50.209565858, 74.634493748), (33.501160964, 71.688351161), align=None)
    extrude(amount=-CUT_EXTRUDE25_DEPTH, mode=Mode.SUBTRACT)


with BuildPart() as cut_extrude21_piece_2:
    # of the separate pieces the step leaves, piece 2, a body of its own (cut_extrude21_pieces)
    add(part.part.solids().sort_by_distance((3.501160964, -17.412639916, 0))[0])

    # Sketch41 → Cut-Extrude22 (cut, through all)
    with BuildSketch(Plane.XY):
        with Locations((-18.815044507, -13.828974806)):
            Rectangle(SKETCH41_W, SKETCH41_H)
    extrude(amount=CUT_EXTRUDE22_DEPTH, mode=Mode.SUBTRACT)


solid = cut_extrude21_piece_1.part
